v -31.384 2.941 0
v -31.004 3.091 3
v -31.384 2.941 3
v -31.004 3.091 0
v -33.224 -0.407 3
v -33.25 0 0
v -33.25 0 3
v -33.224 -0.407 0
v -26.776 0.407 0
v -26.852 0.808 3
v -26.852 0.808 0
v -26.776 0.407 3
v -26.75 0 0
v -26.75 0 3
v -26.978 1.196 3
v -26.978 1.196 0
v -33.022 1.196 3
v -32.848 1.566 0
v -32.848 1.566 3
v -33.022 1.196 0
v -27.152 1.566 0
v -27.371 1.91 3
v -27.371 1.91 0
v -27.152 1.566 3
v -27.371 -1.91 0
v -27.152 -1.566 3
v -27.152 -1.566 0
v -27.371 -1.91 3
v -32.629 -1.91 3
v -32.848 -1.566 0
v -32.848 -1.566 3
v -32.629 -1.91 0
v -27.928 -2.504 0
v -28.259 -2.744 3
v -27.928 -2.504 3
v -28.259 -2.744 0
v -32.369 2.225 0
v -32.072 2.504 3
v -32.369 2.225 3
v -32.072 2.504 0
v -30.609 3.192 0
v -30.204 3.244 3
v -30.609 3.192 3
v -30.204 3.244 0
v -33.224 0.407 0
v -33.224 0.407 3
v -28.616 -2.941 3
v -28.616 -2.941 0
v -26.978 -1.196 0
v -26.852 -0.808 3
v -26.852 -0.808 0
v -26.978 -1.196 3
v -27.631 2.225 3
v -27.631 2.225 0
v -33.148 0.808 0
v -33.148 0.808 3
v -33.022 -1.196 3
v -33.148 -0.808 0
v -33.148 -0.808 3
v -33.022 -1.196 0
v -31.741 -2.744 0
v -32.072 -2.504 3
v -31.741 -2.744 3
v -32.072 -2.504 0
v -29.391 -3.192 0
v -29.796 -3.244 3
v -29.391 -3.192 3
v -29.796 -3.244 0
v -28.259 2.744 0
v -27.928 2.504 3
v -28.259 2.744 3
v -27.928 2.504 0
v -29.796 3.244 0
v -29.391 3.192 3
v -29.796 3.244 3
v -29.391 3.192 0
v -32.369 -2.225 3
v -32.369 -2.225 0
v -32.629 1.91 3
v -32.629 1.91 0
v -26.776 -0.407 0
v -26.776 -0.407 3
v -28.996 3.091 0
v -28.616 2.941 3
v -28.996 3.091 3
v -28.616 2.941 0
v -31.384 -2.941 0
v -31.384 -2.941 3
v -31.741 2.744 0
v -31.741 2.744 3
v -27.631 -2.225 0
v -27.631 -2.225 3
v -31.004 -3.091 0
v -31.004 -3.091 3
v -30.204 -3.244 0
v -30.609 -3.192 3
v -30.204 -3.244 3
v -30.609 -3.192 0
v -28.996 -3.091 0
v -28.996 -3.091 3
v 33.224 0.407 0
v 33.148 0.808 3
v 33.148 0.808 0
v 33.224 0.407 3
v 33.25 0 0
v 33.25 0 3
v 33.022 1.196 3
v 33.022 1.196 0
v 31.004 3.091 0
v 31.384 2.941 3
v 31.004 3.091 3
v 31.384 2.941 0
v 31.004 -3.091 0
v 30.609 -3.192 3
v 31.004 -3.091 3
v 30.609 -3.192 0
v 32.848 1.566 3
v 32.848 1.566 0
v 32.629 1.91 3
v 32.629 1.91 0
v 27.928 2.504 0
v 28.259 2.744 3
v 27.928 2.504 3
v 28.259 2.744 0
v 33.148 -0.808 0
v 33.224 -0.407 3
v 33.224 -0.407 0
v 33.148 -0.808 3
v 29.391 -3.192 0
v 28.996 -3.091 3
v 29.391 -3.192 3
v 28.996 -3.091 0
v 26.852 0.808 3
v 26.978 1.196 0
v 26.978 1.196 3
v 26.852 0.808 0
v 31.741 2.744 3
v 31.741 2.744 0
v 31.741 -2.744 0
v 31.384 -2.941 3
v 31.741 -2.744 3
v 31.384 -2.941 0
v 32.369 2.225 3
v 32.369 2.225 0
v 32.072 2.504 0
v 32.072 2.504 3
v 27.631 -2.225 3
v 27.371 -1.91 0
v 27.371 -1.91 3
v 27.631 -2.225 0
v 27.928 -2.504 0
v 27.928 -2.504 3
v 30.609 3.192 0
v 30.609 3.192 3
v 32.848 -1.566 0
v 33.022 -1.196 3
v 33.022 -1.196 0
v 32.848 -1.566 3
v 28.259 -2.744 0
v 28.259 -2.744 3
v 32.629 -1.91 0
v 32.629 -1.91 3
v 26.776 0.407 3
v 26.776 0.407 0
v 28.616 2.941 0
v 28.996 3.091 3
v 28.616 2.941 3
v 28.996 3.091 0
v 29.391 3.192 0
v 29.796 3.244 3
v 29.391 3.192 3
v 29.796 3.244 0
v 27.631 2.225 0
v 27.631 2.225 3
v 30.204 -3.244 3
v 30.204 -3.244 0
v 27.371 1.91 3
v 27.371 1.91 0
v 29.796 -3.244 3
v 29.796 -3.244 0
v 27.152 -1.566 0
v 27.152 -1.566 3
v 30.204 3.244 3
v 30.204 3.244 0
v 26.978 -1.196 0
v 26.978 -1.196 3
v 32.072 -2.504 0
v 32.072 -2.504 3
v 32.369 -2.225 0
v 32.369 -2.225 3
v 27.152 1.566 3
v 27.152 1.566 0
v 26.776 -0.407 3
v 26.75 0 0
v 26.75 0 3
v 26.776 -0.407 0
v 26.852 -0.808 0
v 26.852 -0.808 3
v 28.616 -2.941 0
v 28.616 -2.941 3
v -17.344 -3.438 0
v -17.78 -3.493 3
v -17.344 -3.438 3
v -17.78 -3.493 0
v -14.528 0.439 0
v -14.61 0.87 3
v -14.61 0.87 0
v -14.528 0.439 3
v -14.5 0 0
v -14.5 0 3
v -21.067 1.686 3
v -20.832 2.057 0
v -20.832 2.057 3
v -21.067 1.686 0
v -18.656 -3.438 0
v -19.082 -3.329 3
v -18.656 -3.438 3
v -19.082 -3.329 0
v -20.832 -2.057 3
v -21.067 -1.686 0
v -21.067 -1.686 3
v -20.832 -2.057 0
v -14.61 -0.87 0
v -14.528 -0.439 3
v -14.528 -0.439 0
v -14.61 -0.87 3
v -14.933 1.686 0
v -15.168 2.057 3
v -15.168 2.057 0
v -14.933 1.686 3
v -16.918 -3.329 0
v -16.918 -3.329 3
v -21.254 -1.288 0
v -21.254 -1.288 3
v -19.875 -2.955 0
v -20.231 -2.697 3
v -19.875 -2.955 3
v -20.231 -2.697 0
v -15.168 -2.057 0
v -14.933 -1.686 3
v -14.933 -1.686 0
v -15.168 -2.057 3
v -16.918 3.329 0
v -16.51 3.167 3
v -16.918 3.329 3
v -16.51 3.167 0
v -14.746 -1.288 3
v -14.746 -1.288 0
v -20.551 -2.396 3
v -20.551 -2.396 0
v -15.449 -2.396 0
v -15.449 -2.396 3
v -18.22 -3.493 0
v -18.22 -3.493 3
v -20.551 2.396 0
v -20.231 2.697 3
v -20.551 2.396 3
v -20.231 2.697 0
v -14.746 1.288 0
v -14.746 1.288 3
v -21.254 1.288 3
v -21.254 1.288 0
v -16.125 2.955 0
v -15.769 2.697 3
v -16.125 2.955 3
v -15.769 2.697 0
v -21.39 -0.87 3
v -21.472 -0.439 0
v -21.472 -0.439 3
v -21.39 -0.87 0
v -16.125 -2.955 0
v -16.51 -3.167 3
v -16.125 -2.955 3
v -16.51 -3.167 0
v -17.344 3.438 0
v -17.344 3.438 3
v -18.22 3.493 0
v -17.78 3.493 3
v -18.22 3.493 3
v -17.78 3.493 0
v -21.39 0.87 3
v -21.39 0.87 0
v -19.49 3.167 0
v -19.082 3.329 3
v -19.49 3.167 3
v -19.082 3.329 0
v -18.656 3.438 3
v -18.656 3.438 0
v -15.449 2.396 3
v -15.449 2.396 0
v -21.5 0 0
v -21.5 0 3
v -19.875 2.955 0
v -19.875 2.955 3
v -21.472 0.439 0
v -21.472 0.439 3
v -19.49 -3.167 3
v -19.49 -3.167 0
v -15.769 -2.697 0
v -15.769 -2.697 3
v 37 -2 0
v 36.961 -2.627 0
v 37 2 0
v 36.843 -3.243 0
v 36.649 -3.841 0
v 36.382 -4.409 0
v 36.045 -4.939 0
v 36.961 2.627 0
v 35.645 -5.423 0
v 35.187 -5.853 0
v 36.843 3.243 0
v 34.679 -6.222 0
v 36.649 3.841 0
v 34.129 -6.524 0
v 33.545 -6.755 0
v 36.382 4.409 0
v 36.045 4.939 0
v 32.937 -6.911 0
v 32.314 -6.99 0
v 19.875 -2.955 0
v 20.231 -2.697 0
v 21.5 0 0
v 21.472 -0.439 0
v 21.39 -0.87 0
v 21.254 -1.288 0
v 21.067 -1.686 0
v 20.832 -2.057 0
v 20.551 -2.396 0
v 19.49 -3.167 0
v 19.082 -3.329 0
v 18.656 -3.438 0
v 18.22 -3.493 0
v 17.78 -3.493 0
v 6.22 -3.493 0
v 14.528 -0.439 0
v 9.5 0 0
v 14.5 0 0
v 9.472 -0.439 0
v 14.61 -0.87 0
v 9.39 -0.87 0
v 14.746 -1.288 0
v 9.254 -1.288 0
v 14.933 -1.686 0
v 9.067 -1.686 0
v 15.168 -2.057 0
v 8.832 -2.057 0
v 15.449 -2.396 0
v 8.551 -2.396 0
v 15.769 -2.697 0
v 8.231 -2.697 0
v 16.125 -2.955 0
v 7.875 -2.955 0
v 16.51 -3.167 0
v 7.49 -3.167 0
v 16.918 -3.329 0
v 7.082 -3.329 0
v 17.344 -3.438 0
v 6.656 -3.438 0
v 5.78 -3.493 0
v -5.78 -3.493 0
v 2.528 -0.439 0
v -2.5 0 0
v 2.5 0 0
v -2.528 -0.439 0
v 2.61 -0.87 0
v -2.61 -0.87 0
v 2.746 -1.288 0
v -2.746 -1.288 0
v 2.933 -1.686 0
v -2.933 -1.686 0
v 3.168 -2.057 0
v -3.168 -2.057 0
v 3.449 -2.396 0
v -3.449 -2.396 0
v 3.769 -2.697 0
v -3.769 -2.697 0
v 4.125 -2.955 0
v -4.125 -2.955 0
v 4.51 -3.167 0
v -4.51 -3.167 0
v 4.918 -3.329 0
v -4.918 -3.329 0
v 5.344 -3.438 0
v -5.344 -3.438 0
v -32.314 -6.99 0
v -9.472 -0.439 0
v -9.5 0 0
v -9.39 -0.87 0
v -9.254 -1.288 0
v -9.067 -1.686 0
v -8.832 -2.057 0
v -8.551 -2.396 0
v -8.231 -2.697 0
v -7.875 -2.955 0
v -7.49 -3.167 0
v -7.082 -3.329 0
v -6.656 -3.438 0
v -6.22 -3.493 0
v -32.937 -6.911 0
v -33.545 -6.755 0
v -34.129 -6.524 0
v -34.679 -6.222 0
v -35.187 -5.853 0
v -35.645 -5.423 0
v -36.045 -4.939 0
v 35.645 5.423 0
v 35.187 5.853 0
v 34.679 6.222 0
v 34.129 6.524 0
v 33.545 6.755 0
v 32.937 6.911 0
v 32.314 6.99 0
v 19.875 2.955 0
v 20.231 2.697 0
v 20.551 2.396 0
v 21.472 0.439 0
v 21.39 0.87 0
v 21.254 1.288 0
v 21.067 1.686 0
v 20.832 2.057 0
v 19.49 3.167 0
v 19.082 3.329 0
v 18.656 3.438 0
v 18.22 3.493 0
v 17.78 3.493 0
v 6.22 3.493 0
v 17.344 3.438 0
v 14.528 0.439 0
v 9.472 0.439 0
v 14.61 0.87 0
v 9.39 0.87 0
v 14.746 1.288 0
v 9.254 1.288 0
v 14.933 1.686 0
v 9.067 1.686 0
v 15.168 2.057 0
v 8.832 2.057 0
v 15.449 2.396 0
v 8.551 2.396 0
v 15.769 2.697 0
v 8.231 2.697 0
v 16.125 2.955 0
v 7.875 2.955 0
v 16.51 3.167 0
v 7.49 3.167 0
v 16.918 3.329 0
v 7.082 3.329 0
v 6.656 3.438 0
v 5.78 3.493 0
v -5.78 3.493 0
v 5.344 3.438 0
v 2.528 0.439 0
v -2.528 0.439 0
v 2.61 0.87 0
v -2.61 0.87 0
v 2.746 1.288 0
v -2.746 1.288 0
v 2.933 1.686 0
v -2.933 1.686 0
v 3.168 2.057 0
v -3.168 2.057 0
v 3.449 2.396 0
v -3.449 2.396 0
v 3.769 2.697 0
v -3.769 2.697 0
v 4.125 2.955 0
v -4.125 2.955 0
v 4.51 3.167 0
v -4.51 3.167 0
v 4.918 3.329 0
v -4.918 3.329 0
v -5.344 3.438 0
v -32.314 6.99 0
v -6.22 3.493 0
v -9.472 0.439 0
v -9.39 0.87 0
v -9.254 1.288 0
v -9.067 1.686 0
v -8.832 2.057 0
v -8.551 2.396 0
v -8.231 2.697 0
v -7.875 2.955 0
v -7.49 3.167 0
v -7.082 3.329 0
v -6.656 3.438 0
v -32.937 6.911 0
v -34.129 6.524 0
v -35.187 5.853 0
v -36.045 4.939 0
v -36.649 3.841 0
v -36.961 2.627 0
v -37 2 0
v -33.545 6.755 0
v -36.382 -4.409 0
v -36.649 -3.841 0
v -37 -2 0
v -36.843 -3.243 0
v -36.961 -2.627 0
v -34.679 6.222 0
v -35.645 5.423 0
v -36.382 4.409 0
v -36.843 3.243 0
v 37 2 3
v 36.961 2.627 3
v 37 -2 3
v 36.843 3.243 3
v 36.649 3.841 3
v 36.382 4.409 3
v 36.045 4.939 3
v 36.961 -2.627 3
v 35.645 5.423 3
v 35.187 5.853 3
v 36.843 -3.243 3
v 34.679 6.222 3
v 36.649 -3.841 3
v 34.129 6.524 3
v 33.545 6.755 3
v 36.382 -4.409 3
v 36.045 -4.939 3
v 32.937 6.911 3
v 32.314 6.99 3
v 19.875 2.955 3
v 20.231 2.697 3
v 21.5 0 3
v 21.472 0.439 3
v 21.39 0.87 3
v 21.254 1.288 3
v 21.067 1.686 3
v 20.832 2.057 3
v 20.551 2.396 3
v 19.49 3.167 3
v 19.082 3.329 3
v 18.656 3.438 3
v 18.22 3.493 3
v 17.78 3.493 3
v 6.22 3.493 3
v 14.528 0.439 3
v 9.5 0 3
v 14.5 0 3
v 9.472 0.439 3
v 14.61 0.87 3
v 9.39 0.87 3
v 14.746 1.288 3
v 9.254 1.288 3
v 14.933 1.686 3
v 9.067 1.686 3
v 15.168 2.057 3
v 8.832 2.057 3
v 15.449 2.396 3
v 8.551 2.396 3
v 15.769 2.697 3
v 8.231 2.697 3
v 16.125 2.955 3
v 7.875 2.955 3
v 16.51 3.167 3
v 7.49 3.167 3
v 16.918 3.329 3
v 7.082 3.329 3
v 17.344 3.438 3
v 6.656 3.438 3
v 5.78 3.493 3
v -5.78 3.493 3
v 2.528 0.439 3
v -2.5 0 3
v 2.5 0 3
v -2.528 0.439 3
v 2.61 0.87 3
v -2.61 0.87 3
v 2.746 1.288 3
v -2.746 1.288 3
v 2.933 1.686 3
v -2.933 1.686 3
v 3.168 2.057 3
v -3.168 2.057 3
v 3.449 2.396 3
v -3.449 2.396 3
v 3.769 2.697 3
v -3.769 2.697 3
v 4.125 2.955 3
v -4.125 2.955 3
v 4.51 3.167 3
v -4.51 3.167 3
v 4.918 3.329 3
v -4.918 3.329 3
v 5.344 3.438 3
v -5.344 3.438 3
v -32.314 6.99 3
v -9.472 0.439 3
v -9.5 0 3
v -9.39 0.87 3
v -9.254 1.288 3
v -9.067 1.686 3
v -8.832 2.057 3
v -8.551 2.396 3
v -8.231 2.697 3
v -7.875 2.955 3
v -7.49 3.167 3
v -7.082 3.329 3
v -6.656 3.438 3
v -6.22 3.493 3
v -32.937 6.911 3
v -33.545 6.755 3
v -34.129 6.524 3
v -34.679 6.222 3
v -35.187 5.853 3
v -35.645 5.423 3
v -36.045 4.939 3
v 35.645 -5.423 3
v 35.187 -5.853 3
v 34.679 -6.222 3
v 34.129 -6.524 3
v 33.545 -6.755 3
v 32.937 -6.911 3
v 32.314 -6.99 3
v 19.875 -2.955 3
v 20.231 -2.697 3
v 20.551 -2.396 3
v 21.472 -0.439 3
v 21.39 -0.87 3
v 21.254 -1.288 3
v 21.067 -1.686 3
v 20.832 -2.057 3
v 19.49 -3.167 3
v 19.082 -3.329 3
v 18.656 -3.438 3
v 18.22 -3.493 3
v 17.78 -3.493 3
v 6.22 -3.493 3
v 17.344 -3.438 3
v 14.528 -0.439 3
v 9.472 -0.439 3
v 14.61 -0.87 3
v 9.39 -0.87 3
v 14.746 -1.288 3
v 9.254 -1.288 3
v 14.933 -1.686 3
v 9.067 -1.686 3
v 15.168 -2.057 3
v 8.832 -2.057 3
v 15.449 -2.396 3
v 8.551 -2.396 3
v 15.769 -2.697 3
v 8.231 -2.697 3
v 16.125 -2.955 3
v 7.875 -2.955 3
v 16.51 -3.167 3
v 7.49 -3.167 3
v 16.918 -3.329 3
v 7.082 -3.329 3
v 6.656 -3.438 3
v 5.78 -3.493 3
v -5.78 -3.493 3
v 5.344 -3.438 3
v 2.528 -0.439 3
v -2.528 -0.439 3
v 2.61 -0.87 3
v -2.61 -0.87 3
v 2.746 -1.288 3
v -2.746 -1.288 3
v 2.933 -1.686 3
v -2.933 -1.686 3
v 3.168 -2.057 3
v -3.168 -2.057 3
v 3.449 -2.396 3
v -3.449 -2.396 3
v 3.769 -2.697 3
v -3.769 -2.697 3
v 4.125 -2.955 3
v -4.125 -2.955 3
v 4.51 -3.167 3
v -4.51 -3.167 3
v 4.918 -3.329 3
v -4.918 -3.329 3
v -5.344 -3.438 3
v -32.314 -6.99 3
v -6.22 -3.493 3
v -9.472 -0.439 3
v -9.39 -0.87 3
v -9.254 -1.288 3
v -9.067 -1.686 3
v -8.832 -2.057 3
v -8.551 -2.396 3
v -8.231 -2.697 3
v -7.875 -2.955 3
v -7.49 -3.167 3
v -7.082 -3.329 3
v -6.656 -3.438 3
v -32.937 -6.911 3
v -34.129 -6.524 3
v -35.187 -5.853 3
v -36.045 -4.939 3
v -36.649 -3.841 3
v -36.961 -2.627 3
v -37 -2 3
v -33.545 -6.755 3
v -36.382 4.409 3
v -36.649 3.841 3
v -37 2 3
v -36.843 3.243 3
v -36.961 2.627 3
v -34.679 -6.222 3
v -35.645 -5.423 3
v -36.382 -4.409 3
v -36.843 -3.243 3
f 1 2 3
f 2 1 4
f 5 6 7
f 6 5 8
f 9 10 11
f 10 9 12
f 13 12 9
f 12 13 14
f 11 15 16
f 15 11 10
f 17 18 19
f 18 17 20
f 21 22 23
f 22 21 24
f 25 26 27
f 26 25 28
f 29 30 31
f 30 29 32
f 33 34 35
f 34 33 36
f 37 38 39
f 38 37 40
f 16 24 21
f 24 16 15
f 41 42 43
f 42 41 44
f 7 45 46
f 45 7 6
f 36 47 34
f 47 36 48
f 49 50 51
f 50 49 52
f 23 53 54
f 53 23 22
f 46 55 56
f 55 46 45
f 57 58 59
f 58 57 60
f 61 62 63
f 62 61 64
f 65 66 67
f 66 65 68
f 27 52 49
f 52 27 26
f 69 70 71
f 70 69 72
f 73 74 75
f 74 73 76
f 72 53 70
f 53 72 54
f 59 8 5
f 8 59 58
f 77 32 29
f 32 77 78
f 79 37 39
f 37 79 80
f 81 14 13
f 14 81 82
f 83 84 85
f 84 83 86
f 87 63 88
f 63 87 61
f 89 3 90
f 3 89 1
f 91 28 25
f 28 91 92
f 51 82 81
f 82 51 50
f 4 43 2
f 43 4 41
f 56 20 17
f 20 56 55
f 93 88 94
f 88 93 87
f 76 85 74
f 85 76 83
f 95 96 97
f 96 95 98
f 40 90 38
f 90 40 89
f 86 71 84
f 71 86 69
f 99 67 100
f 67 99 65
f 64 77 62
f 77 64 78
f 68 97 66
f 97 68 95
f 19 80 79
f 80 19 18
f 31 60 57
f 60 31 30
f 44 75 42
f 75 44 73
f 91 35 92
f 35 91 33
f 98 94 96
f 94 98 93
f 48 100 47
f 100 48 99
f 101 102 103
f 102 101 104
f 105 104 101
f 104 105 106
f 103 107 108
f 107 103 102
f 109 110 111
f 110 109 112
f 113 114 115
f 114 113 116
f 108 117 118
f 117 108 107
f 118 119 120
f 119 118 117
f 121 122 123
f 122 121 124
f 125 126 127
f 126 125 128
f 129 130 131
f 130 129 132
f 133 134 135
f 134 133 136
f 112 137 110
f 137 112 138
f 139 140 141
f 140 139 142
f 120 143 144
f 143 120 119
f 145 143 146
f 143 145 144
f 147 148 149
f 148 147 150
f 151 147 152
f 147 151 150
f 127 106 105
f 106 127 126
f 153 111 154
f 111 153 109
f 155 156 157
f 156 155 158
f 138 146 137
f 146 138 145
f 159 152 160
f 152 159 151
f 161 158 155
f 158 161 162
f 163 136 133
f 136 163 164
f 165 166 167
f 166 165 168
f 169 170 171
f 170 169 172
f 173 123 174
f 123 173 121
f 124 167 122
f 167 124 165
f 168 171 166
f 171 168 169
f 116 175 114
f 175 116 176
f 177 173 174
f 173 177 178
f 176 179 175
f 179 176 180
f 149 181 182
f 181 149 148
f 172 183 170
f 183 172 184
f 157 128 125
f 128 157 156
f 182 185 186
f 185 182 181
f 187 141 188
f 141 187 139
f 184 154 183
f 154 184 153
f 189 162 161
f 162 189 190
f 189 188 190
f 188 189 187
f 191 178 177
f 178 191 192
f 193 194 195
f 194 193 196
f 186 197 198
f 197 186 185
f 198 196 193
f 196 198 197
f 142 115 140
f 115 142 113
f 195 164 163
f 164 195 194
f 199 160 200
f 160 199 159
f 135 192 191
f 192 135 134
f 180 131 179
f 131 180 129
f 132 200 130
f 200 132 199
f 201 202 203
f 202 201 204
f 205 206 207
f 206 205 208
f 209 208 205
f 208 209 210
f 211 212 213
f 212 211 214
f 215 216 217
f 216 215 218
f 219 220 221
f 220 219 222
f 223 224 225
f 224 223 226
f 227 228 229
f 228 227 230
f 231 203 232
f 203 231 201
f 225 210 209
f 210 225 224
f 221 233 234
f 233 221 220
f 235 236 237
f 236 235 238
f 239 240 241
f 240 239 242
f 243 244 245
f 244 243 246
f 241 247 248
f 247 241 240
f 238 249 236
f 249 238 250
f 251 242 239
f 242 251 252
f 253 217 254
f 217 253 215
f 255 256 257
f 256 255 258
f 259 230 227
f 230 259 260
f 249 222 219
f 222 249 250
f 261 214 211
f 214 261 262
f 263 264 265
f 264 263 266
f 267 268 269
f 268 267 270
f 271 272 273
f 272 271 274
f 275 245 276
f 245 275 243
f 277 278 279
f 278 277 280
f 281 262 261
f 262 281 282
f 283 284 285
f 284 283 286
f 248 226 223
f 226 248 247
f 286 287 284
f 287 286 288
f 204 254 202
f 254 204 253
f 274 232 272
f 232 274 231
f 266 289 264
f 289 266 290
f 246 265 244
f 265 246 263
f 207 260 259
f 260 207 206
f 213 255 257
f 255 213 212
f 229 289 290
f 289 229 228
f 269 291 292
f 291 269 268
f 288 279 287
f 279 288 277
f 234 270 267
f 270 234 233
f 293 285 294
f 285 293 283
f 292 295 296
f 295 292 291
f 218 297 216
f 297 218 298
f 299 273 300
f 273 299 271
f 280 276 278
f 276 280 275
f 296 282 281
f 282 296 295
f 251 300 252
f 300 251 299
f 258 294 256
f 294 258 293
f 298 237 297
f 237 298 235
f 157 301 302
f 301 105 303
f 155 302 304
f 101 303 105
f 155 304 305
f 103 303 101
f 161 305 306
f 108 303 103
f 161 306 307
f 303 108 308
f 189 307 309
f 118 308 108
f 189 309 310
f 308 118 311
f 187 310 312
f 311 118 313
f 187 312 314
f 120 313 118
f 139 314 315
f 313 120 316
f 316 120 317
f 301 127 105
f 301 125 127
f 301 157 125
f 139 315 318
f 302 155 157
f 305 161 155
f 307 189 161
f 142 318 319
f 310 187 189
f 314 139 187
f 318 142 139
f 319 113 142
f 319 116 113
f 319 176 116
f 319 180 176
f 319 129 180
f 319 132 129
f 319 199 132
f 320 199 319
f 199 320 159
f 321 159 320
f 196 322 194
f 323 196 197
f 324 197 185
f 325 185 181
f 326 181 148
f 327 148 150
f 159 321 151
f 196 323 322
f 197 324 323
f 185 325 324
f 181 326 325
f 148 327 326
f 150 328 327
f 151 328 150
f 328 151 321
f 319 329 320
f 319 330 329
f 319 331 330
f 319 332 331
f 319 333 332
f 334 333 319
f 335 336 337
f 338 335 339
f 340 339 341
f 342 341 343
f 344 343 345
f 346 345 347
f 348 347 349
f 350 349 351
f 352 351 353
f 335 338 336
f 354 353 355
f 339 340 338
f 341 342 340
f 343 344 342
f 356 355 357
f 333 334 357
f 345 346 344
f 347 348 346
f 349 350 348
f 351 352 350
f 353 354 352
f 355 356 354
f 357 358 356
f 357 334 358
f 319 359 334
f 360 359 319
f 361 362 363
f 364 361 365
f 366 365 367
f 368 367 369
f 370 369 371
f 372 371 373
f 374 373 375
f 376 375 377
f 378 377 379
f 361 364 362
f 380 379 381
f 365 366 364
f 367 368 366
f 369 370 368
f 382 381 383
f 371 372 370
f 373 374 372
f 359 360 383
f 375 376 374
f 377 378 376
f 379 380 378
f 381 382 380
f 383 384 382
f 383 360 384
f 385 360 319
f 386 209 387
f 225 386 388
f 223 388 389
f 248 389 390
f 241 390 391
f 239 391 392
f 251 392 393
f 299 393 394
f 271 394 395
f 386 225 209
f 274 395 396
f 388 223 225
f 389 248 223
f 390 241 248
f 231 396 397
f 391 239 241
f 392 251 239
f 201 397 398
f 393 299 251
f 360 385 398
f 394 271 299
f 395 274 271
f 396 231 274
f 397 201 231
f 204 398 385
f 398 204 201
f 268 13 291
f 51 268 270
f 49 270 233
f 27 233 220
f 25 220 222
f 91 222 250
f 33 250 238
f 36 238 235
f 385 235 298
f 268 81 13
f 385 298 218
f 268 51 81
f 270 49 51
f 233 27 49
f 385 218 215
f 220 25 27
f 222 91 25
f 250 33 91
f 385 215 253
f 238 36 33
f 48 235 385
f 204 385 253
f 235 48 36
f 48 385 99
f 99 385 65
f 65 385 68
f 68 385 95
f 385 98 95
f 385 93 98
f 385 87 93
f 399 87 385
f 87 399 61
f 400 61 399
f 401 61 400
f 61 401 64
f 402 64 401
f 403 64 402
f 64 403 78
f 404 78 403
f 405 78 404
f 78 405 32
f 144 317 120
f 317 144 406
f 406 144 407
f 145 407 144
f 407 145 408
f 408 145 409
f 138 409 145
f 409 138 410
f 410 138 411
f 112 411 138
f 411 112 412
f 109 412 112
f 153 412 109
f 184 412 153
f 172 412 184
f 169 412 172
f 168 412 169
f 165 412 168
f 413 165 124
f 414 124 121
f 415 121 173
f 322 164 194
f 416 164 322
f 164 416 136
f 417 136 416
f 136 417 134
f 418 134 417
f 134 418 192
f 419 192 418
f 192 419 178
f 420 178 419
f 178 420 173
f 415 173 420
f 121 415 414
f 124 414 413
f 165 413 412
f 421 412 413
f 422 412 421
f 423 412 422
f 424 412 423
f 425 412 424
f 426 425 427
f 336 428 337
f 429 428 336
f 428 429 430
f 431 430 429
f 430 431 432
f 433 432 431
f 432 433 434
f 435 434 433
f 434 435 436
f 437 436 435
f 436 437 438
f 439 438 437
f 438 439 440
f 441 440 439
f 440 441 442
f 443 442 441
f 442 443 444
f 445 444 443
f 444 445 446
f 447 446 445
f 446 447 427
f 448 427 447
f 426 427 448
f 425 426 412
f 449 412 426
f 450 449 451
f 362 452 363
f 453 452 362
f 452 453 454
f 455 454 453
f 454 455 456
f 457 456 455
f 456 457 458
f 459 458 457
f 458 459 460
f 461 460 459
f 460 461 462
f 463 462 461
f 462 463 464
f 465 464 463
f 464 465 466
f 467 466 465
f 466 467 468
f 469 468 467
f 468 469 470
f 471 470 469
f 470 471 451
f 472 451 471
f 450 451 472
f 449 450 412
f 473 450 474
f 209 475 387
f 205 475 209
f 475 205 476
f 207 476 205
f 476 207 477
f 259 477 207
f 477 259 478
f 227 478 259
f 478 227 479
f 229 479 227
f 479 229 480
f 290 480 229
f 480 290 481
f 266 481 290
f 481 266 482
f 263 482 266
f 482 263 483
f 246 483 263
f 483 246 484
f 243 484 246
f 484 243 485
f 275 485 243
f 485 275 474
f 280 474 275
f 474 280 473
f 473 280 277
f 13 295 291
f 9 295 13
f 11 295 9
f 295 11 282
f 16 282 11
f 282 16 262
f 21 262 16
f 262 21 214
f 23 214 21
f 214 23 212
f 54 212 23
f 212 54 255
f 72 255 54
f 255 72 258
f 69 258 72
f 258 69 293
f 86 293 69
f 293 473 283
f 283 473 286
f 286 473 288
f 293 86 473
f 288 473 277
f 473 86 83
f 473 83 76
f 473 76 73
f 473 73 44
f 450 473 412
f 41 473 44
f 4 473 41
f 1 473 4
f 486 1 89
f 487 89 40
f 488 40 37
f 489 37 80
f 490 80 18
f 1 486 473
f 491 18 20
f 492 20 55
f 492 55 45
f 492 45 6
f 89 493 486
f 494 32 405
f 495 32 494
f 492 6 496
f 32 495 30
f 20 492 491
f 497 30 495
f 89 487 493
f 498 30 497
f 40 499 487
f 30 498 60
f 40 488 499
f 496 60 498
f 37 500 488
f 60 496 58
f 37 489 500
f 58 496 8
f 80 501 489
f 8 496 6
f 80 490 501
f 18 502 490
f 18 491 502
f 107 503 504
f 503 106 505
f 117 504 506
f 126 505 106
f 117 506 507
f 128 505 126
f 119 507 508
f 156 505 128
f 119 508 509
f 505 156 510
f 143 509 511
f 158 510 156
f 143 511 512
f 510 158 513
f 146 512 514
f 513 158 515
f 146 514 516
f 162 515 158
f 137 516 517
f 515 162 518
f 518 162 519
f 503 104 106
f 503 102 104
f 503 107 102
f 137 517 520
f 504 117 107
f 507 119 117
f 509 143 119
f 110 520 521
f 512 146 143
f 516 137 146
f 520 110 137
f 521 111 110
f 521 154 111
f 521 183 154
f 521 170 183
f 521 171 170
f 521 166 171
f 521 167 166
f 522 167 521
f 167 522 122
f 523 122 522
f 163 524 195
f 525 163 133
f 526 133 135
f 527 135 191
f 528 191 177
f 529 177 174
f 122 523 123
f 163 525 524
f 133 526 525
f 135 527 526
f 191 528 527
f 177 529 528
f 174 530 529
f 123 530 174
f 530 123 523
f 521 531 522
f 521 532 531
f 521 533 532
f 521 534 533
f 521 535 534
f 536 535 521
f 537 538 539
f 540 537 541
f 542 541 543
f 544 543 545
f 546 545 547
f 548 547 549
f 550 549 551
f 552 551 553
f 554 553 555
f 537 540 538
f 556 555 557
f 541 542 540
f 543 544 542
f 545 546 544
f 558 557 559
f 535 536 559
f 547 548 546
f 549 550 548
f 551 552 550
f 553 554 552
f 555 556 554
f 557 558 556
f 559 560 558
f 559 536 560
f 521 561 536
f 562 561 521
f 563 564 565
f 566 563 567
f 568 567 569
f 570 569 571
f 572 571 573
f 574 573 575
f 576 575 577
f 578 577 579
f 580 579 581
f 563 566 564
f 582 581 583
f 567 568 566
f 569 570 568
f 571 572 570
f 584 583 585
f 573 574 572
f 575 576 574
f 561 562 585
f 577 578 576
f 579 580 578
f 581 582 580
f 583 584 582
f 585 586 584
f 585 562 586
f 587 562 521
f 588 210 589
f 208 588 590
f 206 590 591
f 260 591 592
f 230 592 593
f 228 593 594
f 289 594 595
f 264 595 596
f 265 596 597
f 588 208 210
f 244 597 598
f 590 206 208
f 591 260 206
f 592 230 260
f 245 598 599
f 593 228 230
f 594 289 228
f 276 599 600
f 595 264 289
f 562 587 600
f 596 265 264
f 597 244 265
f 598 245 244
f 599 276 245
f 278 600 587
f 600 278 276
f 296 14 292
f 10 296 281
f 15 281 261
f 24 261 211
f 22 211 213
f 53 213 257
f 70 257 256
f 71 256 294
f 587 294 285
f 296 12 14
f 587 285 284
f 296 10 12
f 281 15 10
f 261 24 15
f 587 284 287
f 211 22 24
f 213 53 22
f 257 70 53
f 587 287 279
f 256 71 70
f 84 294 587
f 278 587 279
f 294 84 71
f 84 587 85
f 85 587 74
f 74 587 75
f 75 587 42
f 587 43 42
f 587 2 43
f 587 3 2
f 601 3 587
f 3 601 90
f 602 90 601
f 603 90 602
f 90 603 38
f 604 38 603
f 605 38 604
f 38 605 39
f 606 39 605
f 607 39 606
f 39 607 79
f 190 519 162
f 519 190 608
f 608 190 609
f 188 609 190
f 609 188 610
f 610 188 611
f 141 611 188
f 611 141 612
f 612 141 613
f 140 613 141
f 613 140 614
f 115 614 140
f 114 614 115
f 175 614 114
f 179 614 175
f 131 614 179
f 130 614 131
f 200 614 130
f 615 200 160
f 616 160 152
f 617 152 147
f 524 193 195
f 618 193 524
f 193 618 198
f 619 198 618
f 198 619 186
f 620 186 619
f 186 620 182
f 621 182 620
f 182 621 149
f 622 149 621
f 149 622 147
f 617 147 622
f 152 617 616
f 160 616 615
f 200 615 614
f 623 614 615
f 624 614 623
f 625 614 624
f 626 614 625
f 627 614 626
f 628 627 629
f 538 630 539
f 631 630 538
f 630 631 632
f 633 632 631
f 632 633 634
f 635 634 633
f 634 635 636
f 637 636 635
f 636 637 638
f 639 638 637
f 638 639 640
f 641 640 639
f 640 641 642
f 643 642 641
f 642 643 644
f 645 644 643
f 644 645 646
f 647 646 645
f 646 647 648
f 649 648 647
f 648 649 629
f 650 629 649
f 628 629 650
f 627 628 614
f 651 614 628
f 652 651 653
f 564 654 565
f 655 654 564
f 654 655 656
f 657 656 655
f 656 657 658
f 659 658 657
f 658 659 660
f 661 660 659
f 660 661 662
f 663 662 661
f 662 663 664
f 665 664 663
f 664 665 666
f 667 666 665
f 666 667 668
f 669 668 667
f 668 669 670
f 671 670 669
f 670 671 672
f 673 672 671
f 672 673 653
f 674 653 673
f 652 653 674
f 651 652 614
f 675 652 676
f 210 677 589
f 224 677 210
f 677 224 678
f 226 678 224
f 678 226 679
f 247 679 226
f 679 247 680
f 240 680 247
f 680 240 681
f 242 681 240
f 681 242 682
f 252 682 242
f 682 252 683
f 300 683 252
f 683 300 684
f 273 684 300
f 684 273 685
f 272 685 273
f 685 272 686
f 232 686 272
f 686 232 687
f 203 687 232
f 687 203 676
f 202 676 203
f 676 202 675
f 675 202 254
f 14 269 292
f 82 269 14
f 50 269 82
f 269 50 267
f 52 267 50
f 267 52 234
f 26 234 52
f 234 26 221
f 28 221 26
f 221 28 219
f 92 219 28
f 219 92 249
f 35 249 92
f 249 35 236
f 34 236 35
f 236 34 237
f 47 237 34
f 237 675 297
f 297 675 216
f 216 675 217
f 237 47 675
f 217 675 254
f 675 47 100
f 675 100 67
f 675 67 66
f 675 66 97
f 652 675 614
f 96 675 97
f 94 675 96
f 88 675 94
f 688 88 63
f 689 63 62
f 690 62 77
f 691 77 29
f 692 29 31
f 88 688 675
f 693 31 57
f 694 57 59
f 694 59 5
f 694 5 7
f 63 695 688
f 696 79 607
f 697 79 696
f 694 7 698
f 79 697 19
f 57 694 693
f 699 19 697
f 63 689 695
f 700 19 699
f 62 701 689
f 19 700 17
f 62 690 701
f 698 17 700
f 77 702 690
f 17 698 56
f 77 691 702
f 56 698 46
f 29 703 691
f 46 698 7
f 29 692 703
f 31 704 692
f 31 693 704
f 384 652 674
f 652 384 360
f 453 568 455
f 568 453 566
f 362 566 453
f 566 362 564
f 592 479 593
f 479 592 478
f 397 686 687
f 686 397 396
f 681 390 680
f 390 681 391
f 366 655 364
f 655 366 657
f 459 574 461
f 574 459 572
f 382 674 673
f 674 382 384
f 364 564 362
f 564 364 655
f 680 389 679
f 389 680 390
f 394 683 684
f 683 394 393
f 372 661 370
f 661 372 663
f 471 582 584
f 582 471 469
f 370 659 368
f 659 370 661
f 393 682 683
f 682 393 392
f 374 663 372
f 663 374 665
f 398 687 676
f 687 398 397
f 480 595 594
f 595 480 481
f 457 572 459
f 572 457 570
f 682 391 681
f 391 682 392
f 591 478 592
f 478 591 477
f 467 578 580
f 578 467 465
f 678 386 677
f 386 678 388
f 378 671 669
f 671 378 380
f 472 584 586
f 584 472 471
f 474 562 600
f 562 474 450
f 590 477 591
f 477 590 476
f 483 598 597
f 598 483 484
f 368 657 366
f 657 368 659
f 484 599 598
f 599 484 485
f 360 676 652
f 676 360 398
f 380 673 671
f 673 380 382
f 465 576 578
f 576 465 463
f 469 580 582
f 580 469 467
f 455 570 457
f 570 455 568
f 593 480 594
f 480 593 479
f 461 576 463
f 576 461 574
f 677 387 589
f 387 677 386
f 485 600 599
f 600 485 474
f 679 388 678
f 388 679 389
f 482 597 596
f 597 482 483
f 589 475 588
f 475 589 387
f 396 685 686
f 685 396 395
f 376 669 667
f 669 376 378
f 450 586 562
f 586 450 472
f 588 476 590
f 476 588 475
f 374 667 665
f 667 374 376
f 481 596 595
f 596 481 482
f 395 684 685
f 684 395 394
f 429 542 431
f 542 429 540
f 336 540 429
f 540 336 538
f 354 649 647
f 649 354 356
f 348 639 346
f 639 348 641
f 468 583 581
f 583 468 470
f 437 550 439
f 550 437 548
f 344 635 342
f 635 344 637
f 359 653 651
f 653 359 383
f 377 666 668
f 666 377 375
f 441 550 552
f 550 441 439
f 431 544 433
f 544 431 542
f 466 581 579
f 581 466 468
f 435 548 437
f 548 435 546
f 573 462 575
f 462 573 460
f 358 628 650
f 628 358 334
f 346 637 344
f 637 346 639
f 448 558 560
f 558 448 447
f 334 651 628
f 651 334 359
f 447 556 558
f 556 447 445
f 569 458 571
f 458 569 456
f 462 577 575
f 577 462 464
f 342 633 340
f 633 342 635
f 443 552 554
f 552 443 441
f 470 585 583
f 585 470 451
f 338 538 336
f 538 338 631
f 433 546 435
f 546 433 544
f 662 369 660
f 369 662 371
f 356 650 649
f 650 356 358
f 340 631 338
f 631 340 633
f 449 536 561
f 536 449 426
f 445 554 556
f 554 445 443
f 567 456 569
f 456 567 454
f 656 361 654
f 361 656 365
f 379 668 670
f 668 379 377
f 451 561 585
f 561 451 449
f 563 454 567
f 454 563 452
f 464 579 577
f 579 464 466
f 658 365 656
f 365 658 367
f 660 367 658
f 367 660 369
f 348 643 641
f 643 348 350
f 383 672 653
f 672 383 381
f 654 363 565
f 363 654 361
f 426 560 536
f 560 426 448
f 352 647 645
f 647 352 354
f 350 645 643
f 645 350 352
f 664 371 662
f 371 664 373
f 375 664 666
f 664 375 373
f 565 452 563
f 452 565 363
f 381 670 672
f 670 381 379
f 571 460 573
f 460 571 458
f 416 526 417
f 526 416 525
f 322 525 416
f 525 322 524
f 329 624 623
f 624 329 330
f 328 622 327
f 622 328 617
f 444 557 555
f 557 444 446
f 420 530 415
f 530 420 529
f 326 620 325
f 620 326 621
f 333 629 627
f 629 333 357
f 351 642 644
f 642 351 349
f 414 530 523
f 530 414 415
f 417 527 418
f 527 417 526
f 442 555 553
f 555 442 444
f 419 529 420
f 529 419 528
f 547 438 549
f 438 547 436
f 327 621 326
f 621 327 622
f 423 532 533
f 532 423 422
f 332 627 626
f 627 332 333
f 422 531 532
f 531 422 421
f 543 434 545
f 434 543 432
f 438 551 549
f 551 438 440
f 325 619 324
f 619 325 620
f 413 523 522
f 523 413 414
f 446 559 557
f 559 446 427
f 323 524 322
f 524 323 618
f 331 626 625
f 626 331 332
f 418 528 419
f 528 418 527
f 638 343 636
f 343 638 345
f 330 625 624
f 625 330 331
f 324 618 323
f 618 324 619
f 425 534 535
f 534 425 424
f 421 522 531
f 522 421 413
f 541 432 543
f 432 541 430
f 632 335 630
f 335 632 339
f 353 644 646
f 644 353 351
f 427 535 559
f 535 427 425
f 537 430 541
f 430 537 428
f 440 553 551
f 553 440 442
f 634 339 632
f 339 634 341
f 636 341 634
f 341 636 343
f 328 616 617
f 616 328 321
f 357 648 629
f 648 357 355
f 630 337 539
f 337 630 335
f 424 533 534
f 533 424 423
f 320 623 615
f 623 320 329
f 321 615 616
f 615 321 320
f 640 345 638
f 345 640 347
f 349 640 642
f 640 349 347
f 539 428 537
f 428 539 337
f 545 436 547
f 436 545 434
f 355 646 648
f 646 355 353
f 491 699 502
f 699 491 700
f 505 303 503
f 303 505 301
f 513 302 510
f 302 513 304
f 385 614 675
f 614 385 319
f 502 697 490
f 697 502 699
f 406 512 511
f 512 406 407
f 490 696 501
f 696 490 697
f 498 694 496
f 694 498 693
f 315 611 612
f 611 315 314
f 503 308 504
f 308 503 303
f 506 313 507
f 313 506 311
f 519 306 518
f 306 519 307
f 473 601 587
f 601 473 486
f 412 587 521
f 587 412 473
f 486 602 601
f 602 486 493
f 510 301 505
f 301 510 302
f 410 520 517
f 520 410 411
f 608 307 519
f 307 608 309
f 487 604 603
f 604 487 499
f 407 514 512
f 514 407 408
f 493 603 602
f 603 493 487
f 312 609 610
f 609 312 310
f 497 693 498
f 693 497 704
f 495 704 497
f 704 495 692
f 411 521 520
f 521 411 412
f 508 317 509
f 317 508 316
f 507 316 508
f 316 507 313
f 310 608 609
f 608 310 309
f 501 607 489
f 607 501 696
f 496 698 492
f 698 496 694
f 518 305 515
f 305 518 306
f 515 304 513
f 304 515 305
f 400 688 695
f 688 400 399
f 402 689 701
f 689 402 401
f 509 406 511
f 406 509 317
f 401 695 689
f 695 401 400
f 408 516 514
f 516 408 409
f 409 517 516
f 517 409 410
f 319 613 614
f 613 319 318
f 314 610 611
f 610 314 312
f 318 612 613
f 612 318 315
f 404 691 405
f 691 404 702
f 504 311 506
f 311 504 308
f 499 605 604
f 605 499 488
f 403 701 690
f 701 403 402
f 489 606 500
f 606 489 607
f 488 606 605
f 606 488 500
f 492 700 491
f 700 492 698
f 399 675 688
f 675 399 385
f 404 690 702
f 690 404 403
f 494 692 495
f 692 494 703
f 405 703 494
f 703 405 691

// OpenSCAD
$fn = 50;


difference() {
	union() {
		hull() {
			translate(v = [-32.0000000000, 2.0000000000, 0]) {
				cylinder(h = 3, r = 5);
			}
			translate(v = [32.0000000000, 2.0000000000, 0]) {
				cylinder(h = 3, r = 5);
			}
			translate(v = [-32.0000000000, -2.0000000000, 0]) {
				cylinder(h = 3, r = 5);
			}
			translate(v = [32.0000000000, -2.0000000000, 0]) {
				cylinder(h = 3, r = 5);
			}
		}
	}
	union() {
		#translate(v = [-30.0000000000, 0.0000000000, 0]) {
			cylinder(h = 3, r = 3.2500000000);
		}
		#translate(v = [30.0000000000, 0.0000000000, 0]) {
			cylinder(h = 3, r = 3.2500000000);
		}
		#translate(v = [-30.0000000000, 0.0000000000, -100.0000000000]) {
			cylinder(h = 200, r = 3.2500000000);
		}
		#translate(v = [-30.0000000000, 0.0000000000, -100.0000000000]) {
			cylinder(h = 200, r = 3.2500000000);
		}
		#translate(v = [30.0000000000, 0.0000000000, -100.0000000000]) {
			cylinder(h = 200, r = 3.2500000000);
		}
		#translate(v = [30.0000000000, 0.0000000000, -100.0000000000]) {
			cylinder(h = 200, r = 3.2500000000);
		}
		#translate(v = [-30.0000000000, 0.0000000000, 0]) {
			cylinder(h = 3, r = 1.8000000000);
		}
		#translate(v = [30.0000000000, 0.0000000000, 0]) {
			cylinder(h = 3, r = 1.8000000000);
		}
		#translate(v = [-30.0000000000, 0.0000000000, 0]) {
			cylinder(h = 3, r = 1.8000000000);
		}
		#translate(v = [30.0000000000, 0.0000000000, 0]) {
			cylinder(h = 3, r = 1.8000000000);
		}
		#translate(v = [-30.0000000000, 0.0000000000, 0]) {
			cylinder(h = 3, r = 1.8000000000);
		}
		#translate(v = [30.0000000000, 0.0000000000, 0]) {
			cylinder(h = 3, r = 1.8000000000);
		}
		#translate(v = [-18.0000000000, 0, 0]) {
			cylinder(h = 3, r = 3.5000000000);
		}
		#translate(v = [-6.0000000000, 0, 0]) {
			cylinder(h = 3, r = 3.5000000000);
		}
		#translate(v = [6.0000000000, 0, 0]) {
			cylinder(h = 3, r = 3.5000000000);
		}
		#translate(v = [18.0000000000, 0, 0]) {
			cylinder(h = 3, r = 3.5000000000);
		}
	}
}
